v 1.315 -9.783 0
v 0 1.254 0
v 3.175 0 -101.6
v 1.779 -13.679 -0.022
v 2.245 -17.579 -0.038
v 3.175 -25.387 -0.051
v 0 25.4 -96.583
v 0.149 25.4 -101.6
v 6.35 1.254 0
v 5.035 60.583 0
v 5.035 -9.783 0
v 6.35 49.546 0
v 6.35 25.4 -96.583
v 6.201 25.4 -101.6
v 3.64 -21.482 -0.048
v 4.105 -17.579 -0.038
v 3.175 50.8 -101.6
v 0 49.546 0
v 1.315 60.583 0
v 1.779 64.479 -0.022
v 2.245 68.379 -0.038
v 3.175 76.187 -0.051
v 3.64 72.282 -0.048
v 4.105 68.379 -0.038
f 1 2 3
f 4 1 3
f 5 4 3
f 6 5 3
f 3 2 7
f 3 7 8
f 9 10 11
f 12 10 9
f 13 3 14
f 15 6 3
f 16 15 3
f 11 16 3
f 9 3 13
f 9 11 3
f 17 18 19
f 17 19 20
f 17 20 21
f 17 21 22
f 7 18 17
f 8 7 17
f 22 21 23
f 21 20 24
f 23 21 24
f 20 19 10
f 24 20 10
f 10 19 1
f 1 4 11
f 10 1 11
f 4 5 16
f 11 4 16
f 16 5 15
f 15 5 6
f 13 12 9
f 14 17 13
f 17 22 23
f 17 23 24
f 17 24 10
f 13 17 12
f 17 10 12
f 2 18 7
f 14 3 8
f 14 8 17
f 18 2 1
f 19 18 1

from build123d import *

# Parameters (mm, degrees)
SKETCH1_W               = 101.6
SKETCH1_H               = 50.8
BOSS_EXTRUDE1_DEPTH     = 6.35
CHAMFER1_SIZE           = 3.175
CHAMFER1_SIZE2          = 25.858299909
CHAMFER2_SIZE           = 3.175
CHAMFER2_SIZE_2         = 25.858299909
CHAMFER3_SIZE           = 3.175
CHAMFER3_SIZE2          = 25.858299909
CHAMFER4_SIZE           = 3.175
CHAMFER4_SIZE_2         = 25.858299909
CUT_EXTRUDE1_DEPTH      = 76.2
CUT_EXTRUDE1_DEPTH_BACK = 25.4


with BuildPart() as part:
    # Sketch1 → Boss-Extrude1 (new body)
    with BuildSketch(Plane(origin=(0, 0, 0), x_dir=(0, 0, -1), z_dir=(1, 0, 0))):
        with Locations((50.8, 25.4)):
            Rectangle(SKETCH1_W, SKETCH1_H)
        Polygon((0, 76.2), (101.6, 50.8), (0, 50.8), align=None)
        Polygon((0, 0), (0, -25.4), (101.6, 0), align=None)
    extrude(amount=BOSS_EXTRUDE1_DEPTH)

    # Chamfer1
    chamfer1_edges = [part.edges().sort_by_distance(p)[0] for p in [
        (0, 63.5, -50.8),
    ]]
    chamfer1_side = [part.faces().sort_by_distance(p)[0] for p in [
        (3.175, 63.5, -50.8),
    ]]
    chamfer(chamfer1_edges, length=CHAMFER1_SIZE, length2=CHAMFER1_SIZE2, reference=chamfer1_side[0])

    # Chamfer2
    # the kernel refuses this chamfer: 25.858299909, 3.175 mm, written as the material it takes off along each edge
    with BuildSketch(Plane(origin=(6.35, 92.501557672, 65.20623069), x_dir=(-0.954887306003921, 0.28810166968922074, -0.07202541742230516), z_dir=(0, -0.24253562503633294, -0.970142500145332))) as chamfer2_piece_1:
        Polygon((CHAMFER2_SIZE * 0.954887306004, -CHAMFER2_SIZE * 0.296968403761), (-CHAMFER2_SIZE_2 * 0.296968403759, -CHAMFER2_SIZE_2 * 0.954887305997), (0, 0), align=None)
    extrude(amount=239.152971182, mode=Mode.SUBTRACT)

    # Chamfer3
    chamfer3_edges = [part.edges().sort_by_distance(p)[0] for p in [
        (0, -12.7, -50.8),
    ]]
    chamfer3_side = [part.faces().sort_by_distance(p)[0] for p in [
        (3.175, -12.7, -50.8),
    ]]
    chamfer(chamfer3_edges, length=CHAMFER3_SIZE, length2=CHAMFER3_SIZE2, reference=chamfer3_side[0])

    # Chamfer4
    # the kernel refuses this chamfer: 25.858299909, 3.175 mm, written as the material it takes off along each edge
    with BuildSketch(Plane(origin=(6.35, -41.701557672, 65.20623069), x_dir=(-0.9548873060039216, -0.2881016696892189, -0.07202541742230473), z_dir=(0, 0.24253562503633297, -0.9701425001453319))) as chamfer4_piece_1:
        Polygon((CHAMFER4_SIZE * 0.954887306004, CHAMFER4_SIZE * 0.296968403761), (-CHAMFER4_SIZE_2 * 0.296968403759, CHAMFER4_SIZE_2 * 0.954887305997), (0, 0), align=None)
    extrude(amount=239.152971182, mode=Mode.SUBTRACT)

    # Sketch2 → Cut-Extrude1 (cut, two sides: drawn at the far end of the back side and taken through both)
    with BuildSketch(Plane(origin=(0, 0, 0), x_dir=(1, 0, 0), z_dir=(0, 1, 0)).offset(-CUT_EXTRUDE1_DEPTH_BACK)):
        with BuildLine():
            Line((3.175, -34.036), (-2.377874902, -0.404533862))
            ThreePointArc((-2.377874902, -0.404533862), (3.986335677, 0.041142906), (10.322125098, -0.706905547))
            Line((10.322125098, -0.706905547), (3.175, -34.036))
        make_face()
    extrude(amount=CUT_EXTRUDE1_DEPTH + CUT_EXTRUDE1_DEPTH_BACK, mode=Mode.SUBTRACT)


solid = part.part
